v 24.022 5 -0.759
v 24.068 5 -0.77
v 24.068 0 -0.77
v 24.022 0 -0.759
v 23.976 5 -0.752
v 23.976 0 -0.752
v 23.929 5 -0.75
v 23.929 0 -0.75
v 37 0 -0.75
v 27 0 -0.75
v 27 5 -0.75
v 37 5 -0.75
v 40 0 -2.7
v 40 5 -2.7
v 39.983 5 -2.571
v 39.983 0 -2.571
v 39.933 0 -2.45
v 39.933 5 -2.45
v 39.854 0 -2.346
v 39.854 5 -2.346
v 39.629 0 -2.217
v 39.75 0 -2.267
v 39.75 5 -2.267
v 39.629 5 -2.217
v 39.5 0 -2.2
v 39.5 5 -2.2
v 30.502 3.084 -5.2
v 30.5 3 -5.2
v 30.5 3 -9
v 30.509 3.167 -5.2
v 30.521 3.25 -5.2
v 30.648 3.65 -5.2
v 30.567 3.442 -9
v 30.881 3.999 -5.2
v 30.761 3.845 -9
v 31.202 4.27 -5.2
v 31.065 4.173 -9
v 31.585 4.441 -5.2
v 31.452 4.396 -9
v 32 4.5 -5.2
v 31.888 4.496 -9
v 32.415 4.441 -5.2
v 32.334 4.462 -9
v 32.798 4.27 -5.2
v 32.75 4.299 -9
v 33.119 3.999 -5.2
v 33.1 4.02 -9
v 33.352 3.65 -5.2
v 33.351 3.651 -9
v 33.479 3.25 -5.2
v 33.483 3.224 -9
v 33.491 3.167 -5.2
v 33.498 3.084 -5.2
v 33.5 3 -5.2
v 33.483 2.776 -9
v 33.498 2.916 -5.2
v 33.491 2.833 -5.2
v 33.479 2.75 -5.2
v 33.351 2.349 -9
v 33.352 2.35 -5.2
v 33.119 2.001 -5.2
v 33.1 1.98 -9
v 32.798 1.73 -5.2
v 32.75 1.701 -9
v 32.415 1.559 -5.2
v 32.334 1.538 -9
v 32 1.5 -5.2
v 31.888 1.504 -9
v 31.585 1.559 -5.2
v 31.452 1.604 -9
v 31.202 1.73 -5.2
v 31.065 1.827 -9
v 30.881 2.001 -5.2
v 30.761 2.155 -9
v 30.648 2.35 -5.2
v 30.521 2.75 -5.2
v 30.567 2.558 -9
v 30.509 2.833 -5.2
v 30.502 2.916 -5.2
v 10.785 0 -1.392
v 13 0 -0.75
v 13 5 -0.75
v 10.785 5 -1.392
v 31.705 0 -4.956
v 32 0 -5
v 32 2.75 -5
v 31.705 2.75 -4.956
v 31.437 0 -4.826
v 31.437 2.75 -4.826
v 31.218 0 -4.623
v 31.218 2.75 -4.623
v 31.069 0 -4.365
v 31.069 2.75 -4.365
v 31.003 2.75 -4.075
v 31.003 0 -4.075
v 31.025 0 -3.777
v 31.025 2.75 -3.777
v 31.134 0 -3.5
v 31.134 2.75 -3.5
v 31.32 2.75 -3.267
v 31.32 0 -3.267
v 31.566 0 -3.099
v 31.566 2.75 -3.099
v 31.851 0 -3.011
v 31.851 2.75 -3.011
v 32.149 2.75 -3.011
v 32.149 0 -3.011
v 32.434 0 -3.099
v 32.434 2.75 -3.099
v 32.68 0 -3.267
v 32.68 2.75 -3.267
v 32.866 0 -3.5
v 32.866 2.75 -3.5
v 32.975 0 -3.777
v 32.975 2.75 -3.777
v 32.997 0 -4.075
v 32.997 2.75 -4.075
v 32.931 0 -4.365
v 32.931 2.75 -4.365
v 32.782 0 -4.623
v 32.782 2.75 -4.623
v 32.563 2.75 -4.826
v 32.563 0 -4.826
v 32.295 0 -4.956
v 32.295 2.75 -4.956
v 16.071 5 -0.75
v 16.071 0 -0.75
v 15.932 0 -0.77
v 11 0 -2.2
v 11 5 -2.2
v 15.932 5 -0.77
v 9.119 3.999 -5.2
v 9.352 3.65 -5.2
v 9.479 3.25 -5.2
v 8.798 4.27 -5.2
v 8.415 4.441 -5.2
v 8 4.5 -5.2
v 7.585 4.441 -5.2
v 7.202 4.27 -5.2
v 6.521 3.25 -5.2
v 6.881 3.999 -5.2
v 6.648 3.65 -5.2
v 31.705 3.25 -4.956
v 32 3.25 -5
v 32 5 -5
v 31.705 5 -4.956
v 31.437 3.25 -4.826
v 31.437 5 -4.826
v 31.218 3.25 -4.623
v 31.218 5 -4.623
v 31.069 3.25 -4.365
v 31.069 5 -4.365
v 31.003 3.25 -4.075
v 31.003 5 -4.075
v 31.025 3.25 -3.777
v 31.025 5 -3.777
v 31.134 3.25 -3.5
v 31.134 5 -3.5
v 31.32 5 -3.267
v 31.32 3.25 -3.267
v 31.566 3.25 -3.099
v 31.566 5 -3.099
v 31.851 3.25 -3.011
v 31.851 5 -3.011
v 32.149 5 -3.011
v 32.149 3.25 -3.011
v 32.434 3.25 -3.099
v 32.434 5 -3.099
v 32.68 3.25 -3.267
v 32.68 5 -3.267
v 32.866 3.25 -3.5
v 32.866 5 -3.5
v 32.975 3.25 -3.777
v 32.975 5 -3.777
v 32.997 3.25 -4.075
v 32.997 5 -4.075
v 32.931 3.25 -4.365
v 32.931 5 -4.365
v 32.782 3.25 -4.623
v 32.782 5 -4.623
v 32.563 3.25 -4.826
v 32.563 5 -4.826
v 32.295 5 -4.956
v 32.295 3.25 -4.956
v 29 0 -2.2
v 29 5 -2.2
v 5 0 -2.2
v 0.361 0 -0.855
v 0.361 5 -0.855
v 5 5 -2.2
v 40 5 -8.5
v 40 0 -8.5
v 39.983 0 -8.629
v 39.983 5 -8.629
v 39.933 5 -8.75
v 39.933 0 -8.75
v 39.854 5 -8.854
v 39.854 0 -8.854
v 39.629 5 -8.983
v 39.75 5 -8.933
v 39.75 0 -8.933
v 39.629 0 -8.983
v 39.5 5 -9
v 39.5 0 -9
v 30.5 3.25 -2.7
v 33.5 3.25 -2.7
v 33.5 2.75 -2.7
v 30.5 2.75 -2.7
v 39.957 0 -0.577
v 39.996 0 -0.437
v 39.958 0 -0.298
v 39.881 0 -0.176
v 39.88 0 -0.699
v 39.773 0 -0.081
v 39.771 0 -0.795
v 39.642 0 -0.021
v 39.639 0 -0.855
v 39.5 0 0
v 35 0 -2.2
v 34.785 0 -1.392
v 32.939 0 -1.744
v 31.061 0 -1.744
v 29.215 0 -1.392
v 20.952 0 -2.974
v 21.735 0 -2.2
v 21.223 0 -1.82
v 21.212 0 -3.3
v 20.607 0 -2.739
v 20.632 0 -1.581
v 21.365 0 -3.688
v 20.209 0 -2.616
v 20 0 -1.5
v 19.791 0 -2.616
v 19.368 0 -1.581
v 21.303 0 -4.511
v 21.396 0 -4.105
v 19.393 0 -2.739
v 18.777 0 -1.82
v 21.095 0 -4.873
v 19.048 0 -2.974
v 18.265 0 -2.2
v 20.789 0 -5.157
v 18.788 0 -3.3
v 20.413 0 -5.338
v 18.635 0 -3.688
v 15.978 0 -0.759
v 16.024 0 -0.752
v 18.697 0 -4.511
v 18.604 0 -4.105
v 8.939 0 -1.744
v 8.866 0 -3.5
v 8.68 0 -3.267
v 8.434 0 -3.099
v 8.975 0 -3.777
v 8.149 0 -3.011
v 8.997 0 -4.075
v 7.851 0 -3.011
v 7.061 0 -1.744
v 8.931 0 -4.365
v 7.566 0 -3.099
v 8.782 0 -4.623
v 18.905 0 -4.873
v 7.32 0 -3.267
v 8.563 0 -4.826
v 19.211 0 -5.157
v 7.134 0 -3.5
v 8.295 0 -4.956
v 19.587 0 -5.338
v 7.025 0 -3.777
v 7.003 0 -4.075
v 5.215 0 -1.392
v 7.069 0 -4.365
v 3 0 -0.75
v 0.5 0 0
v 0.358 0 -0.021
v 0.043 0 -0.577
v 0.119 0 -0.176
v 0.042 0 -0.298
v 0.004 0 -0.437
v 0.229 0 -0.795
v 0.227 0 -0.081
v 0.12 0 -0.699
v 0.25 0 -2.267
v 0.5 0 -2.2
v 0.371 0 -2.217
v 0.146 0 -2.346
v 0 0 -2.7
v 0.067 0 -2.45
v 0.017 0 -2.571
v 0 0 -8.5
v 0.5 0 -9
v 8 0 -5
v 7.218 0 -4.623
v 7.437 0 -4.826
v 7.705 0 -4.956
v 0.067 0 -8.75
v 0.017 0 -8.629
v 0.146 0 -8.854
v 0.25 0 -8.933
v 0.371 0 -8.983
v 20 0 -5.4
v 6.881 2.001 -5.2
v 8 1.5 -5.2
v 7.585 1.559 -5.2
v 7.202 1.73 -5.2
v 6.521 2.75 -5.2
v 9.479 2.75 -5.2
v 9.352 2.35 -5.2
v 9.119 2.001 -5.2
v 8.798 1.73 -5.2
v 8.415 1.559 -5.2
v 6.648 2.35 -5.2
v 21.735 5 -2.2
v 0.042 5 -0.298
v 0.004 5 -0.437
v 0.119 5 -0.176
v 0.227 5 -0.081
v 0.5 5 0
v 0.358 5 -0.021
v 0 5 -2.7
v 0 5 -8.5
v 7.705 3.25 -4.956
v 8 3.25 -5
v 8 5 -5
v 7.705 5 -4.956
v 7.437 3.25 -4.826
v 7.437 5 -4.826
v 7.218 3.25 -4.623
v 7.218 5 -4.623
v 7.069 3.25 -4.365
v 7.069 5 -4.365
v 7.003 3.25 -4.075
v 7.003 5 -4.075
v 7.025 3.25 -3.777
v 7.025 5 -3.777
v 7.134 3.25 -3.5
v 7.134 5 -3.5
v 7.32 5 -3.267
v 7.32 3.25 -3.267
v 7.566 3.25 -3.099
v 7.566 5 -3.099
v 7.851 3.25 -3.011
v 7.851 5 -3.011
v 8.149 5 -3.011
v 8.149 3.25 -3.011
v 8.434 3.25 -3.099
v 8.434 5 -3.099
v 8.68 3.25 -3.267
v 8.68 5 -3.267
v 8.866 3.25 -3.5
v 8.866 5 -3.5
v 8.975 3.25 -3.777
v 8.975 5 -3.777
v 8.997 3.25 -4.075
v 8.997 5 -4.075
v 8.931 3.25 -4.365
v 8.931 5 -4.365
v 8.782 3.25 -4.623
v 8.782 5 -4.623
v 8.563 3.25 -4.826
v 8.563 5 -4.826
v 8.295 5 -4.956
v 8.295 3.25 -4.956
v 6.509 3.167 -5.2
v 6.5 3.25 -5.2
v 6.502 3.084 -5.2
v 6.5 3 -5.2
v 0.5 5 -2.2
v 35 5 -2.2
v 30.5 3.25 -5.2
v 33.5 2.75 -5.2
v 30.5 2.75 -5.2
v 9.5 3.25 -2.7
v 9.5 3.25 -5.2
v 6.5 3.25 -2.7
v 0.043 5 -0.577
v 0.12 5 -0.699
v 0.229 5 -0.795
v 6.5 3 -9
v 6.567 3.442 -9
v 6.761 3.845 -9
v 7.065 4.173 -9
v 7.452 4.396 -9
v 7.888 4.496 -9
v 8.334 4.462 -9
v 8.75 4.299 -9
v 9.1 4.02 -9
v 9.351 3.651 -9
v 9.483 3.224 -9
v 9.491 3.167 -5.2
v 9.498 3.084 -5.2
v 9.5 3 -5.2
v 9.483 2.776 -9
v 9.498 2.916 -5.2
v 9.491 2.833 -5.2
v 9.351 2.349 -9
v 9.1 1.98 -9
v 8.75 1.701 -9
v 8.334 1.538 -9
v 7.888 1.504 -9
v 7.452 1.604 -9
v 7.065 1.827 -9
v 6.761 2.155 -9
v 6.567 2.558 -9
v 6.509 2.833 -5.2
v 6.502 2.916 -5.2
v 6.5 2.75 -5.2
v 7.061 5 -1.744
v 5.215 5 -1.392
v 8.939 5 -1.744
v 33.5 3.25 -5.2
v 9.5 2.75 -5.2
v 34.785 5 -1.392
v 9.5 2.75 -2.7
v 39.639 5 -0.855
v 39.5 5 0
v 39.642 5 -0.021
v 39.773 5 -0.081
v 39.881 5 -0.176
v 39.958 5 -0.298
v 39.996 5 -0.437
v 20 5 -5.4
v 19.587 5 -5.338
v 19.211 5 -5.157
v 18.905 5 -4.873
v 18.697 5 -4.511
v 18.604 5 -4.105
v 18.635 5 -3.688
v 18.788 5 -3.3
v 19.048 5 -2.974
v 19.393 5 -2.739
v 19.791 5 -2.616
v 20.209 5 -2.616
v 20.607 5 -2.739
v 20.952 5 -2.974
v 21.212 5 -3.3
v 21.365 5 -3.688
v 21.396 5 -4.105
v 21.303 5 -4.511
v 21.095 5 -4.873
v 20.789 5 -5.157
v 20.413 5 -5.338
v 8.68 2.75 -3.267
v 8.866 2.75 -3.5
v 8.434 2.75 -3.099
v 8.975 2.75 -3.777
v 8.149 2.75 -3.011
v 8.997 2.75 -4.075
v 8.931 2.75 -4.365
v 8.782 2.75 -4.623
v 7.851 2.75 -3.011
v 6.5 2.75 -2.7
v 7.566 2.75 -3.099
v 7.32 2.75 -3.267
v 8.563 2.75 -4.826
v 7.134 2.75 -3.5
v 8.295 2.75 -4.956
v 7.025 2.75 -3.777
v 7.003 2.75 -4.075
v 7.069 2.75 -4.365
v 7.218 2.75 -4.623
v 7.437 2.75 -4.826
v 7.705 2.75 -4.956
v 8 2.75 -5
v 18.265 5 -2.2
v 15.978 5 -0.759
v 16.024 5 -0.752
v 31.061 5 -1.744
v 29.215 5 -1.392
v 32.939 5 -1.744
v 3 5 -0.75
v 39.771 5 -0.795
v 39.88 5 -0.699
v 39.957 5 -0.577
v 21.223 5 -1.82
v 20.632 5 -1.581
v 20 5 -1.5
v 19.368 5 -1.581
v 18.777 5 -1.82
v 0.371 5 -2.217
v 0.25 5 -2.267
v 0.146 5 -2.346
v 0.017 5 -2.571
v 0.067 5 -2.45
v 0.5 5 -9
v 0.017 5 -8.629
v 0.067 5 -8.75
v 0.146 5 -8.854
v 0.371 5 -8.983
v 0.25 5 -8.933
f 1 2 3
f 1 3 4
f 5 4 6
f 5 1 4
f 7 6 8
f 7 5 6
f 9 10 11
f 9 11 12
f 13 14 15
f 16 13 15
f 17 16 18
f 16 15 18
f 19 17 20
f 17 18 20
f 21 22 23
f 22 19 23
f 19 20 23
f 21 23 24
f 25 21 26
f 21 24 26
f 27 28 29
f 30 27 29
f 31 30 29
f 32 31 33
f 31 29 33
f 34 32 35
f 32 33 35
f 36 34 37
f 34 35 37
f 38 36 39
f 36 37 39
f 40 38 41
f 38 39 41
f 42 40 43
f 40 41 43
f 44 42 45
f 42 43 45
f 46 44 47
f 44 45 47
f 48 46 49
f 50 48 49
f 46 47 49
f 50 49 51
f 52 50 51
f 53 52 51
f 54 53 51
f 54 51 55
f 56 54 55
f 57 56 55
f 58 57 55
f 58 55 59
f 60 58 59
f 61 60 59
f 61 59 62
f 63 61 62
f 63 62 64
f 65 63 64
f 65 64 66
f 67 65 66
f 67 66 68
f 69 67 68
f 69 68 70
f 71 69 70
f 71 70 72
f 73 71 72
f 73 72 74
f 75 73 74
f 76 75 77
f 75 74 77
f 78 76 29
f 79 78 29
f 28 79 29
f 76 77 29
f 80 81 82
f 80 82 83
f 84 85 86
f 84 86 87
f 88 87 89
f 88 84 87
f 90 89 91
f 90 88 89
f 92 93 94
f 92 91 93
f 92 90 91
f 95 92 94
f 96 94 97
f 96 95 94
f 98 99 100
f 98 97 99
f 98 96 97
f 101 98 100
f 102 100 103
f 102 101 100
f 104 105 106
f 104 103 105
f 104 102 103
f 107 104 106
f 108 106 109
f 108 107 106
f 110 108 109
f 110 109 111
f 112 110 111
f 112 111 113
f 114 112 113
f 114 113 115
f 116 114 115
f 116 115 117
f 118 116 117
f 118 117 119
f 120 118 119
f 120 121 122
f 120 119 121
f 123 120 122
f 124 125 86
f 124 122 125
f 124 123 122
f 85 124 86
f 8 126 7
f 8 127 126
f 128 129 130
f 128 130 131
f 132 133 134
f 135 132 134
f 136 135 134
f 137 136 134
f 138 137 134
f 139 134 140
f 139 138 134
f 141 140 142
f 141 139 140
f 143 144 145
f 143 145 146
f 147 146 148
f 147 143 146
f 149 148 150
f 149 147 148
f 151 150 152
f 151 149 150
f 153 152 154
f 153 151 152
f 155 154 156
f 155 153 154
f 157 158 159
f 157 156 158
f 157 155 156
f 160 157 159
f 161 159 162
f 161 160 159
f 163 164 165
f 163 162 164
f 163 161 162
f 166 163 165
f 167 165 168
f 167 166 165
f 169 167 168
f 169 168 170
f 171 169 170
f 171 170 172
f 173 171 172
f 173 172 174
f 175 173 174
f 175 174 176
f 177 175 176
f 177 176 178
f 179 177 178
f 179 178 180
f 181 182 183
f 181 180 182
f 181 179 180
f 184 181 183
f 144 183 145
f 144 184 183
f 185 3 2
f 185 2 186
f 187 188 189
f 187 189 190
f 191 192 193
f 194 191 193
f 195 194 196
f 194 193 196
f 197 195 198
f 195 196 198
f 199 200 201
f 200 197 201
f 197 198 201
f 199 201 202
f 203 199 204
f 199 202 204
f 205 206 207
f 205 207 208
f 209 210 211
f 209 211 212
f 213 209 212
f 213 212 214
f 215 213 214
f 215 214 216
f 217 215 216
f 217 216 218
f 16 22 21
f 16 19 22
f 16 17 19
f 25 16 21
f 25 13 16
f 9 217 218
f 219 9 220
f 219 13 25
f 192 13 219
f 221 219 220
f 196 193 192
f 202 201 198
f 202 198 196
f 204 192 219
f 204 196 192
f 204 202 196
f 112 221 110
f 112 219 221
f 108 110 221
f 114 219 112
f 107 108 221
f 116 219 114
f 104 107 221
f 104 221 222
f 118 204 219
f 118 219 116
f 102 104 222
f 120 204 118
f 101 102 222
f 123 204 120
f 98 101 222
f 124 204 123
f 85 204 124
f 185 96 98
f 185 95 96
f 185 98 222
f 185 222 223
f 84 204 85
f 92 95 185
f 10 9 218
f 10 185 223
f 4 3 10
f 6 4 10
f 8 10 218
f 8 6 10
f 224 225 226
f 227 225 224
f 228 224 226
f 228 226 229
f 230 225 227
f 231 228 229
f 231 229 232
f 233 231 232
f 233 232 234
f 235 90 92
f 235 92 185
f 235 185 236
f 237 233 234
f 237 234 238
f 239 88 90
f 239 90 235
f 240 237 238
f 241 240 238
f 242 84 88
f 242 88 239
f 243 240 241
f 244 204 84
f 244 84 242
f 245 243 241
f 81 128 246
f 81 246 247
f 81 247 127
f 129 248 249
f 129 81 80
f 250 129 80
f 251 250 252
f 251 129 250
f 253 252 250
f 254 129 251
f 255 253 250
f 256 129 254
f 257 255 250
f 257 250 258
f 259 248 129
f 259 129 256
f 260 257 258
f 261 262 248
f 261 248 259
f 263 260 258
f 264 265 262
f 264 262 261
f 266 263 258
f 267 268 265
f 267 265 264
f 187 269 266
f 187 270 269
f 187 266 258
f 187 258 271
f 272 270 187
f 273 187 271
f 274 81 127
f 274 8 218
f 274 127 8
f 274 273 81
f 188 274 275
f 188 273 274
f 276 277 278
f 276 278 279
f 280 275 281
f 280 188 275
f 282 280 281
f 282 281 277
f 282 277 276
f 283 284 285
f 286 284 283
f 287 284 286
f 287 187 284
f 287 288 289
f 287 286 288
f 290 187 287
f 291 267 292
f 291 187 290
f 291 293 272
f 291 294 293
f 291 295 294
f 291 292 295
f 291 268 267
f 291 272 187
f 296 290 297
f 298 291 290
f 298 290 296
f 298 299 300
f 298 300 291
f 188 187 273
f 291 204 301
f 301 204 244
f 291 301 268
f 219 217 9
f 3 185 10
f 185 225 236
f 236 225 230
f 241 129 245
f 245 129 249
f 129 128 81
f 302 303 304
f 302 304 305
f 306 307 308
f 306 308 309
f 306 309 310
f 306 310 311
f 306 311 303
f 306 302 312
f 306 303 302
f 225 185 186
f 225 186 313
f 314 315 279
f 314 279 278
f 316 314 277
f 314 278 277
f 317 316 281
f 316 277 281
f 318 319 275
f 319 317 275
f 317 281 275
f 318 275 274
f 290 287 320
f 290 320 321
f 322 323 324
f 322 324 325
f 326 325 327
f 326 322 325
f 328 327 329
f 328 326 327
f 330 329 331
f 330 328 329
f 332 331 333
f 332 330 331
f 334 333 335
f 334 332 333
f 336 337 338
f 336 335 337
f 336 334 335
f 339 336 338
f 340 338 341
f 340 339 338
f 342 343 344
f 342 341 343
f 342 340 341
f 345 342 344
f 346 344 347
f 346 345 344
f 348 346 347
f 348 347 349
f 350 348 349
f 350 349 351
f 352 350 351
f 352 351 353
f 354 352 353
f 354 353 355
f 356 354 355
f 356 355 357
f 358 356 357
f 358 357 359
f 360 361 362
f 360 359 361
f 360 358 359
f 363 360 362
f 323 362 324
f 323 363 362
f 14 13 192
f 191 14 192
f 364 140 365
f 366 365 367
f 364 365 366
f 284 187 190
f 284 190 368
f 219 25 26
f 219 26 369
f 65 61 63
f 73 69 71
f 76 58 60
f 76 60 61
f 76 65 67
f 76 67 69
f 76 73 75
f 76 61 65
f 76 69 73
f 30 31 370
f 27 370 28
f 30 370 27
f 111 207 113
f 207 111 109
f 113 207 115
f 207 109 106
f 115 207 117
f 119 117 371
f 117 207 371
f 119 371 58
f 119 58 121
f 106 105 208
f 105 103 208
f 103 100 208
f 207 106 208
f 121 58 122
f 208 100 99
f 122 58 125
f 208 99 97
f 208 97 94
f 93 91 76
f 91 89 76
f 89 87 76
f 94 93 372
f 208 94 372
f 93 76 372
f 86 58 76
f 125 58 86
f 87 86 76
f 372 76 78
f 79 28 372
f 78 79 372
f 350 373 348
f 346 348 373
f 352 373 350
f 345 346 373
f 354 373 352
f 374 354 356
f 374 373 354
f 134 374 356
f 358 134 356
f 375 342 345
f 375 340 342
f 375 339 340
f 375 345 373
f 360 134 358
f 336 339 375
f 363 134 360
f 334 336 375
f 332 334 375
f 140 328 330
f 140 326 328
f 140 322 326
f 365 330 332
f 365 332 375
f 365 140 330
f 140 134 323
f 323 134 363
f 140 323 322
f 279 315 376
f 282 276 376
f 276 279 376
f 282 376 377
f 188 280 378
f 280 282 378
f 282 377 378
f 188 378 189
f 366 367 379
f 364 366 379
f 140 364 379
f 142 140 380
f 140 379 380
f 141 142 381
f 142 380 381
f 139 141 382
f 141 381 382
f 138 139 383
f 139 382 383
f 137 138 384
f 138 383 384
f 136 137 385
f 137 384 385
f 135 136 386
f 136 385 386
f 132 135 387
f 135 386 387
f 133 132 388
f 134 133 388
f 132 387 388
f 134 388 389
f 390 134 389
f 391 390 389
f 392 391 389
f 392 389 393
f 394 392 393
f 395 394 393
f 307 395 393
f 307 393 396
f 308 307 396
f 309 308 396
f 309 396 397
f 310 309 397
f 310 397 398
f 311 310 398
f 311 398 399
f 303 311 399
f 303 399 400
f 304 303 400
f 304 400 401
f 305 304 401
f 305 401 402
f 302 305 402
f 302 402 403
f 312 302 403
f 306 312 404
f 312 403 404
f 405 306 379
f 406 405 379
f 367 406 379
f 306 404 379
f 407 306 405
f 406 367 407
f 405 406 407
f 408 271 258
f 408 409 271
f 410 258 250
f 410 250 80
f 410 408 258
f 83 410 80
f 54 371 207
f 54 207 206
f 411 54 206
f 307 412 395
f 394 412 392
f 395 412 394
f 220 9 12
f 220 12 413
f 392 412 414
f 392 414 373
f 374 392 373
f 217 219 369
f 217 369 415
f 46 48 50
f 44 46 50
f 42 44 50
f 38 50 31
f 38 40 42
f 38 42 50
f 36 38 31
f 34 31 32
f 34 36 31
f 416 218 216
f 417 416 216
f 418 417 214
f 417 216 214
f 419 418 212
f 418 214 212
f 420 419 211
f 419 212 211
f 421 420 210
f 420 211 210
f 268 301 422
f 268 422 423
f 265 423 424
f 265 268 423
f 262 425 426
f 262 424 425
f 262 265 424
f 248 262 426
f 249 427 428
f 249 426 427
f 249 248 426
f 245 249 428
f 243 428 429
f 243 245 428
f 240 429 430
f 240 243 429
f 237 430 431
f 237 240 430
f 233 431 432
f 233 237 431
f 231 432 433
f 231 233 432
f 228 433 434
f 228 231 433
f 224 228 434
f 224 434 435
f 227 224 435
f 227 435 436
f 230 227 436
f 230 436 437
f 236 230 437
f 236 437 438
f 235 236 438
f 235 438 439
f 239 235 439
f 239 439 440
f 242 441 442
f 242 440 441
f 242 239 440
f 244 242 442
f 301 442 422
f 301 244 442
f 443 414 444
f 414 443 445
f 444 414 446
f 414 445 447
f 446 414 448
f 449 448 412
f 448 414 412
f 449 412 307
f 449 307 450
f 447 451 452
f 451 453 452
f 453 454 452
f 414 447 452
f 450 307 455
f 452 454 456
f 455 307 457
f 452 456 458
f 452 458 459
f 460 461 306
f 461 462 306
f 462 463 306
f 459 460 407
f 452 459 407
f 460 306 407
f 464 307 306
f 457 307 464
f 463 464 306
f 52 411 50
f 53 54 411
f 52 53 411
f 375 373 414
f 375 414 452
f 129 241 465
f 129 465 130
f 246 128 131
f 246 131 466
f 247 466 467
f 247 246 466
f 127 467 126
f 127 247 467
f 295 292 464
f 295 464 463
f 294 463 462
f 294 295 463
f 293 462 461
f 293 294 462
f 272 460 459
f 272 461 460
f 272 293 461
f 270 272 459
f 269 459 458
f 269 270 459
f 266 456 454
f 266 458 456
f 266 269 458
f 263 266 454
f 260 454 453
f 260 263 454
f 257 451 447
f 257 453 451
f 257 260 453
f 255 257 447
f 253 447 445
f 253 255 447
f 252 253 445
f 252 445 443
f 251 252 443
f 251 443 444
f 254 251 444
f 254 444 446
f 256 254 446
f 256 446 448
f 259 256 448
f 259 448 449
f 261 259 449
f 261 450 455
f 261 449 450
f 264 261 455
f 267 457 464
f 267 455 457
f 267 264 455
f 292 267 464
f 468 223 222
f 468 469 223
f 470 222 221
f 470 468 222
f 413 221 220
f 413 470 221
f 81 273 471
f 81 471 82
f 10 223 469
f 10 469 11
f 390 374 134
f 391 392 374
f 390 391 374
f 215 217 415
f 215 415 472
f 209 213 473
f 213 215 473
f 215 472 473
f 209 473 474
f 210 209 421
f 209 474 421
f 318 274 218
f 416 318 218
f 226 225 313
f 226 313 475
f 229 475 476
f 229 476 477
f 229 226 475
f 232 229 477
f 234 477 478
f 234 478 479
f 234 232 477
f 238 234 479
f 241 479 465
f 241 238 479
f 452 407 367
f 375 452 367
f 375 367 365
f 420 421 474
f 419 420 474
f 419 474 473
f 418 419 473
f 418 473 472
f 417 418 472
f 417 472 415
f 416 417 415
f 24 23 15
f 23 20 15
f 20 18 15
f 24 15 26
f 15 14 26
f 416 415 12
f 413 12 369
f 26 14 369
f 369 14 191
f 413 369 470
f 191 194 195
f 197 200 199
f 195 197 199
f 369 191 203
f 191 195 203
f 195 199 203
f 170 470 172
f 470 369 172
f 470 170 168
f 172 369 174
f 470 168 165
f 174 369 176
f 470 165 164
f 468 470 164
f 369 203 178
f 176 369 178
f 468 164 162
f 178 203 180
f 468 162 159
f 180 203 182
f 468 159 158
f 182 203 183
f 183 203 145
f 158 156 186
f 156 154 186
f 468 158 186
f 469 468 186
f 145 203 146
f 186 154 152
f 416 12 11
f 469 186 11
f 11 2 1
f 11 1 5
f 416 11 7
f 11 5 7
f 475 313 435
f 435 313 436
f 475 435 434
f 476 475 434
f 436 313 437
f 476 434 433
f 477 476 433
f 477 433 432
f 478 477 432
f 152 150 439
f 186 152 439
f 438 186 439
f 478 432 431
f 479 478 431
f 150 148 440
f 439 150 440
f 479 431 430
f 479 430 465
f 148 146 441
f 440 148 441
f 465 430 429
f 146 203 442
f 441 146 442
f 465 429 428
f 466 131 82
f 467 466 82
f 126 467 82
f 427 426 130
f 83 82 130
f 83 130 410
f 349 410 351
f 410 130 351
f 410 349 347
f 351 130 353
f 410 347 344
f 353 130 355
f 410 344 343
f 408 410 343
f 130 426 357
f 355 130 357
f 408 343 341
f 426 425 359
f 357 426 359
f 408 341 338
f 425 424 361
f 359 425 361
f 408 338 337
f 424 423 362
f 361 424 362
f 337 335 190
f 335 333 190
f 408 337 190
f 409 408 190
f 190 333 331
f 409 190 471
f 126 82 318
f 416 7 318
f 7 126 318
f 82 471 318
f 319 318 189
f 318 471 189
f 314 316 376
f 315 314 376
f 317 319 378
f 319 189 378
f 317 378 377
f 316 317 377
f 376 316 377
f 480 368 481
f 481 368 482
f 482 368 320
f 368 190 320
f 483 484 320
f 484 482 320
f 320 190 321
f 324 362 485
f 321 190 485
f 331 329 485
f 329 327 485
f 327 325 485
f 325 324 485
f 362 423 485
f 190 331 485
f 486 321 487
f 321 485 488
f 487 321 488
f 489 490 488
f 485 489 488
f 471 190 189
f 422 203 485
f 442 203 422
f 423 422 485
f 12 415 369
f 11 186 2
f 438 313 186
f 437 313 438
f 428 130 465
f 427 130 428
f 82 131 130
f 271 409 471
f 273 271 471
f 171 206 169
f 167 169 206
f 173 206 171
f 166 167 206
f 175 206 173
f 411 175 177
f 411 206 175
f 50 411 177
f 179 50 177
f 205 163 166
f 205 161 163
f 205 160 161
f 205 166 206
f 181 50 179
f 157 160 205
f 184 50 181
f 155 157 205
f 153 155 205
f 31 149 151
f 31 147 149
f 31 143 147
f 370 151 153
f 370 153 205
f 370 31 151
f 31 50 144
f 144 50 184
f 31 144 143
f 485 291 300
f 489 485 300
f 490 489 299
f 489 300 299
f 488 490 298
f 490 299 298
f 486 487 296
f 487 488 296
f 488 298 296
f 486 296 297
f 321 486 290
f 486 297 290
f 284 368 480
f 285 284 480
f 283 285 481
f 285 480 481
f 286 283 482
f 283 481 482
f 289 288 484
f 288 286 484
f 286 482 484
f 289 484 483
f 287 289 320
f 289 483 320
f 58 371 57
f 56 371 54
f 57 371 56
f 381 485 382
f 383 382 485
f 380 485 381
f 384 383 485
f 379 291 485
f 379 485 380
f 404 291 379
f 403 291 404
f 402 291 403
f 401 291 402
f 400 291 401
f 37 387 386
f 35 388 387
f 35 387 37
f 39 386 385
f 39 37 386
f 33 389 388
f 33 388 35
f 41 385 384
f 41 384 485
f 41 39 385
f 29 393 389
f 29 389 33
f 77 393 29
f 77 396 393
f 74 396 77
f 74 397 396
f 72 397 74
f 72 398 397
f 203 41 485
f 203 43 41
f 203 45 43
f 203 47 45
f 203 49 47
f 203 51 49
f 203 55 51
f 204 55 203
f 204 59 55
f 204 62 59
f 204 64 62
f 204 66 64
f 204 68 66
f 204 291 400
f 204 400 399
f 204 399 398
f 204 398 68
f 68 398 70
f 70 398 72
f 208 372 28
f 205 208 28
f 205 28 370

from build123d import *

# Parameters (mm, degrees)
SKETCH1_W               = 40
SKETCH1_H               = 9
BOSS_EXTRUDE1_DEPTH     = 5
CUT_EXTRUDE1_DEPTH      = 5
CUT_EXTRUDE1_DEPTH_BACK = 10
SKETCH2_R               = 1
SKETCH2_R_2             = 1.4
FILLET1_R               = 10
FILLET2_R               = 0.5
SKETCH3_R               = 1.5
CUT_EXTRUDE6_DEPTH      = 3.8
SKETCH4_W               = 3
SKETCH4_H               = 0.5
CUT_EXTRUDE7_DEPTH      = 2.5


with BuildPart() as part:
    # Sketch1 → Boss-Extrude1 (new body)
    with BuildSketch(Plane(origin=(0, 0, 0), x_dir=(1, 0, 0), z_dir=(0, 1, 0))):
        with Locations((20, 4.5)):
            Rectangle(SKETCH1_W, SKETCH1_H)
    extrude(amount=BOSS_EXTRUDE1_DEPTH)

    # Sketch2 → Cut-Extrude1 (cut, two sides: drawn at the far end of the back side and taken through both)
    with BuildSketch(Plane(origin=(0, 5, 0), x_dir=(1, 0, 0), z_dir=(0, 1, 0)).offset(-CUT_EXTRUDE1_DEPTH_BACK)):
        with Locations(Location((8, 4, 0), (0, 0, 90))):
            Circle(SKETCH2_R)
        with Locations(Location((32, 4, 0), (0, 0, 90))):
            Circle(SKETCH2_R)
        with Locations(Location((20, 4, 0), (0, 0, 90))):
            Circle(SKETCH2_R_2)
        with BuildLine():
            ThreePointArc((21.734935157, 2.2), (20, 1.5), (18.265064843, 2.2))
            Line((18.265064843, 2.2), (11, 2.2))
            Line((11, 2.2), (16, 0.75))
            Line((16, 0.75), (24, 0.75))
            Line((24, 0.75), (29, 2.2))
            Line((29, 2.2), (21.734935157, 2.2))
        make_face()
        Polygon((13, 0.75), (8, 2.2), (3, 0.75), align=None)
        Polygon((37, 0.75), (32, 2.2), (27, 0.75), align=None)
        Polygon((0, 0.75), (5, 2.2), (0, 2.2), align=None)
        Polygon((40, 2.2), (35, 2.2), (40, 0.75), align=None)
    extrude(amount=CUT_EXTRUDE1_DEPTH + CUT_EXTRUDE1_DEPTH_BACK, mode=Mode.SUBTRACT)

    # Fillet1
    fillet1_edges = [part.edges().sort_by_distance(p)[0] for p in [
        (32, 2.5, -2.2),
        (8, 2.5, -2.2),
    ]]
    fillet(fillet1_edges, radius=FILLET1_R)

    # Fillet2
    # the kernel refuses this fillet: 0.5 mm, written as the material it adds along each edge
    with BuildSketch(Plane(origin=(24, 5, -0.75), x_dir=(0.9604291387787307, 0, -0.27852445024583705), z_dir=(0, -1, 0))) as fillet2_piece_1:
        with BuildLine():
            CenterArc((FILLET2_R * 0.142073204655, -FILLET2_R), FILLET2_R, 90, 16.172159016)
            Line((-FILLET2_R * 0.136451245591, -FILLET2_R * 0.0395708612213), (0, 0))
            Line((0, 0), (FILLET2_R * 0.142073204655, 0))
        make_face()
    extrude(amount=5)
    with BuildSketch(Plane(origin=(16, 0, -0.75), x_dir=(1, 0, 0), z_dir=(0, 1, 0))) as fillet2_piece_2:
        with BuildLine():
            CenterArc((FILLET2_R * 0.142073204655, FILLET2_R), FILLET2_R, 253.827840984, 16.172159016)
            Line((-FILLET2_R * 0.136451245591, FILLET2_R * 0.0395708612213), (0, 0))
            Line((0, 0), (FILLET2_R * 0.142073204655, 0))
        make_face()
    extrude(amount=5)
    # the kernel refuses this fillet: 0.5 mm, written as the material it takes off along each edge
    with BuildSketch(Plane(origin=(0, 5.939001537, -0.75), x_dir=(0.960429138778732, 0, -0.2785244502458324), z_dir=(0, -1, 0)), Plane(origin=(40, 5.939001537, -0.75), x_dir=(0, 0, 1), z_dir=(0, -1, 0))) as fillet2_2_piece_1:
        with BuildLine():
            CenterArc((FILLET2_R * 0.75120122935, FILLET2_R), FILLET2_R, 196.172159016, 73.827840984)
            Line((-FILLET2_R * 0.209227909429, FILLET2_R * 0.721475549754), (0, 0))
            Line((0, 0), (FILLET2_R * 0.75120122935, 0))
        make_face()
    extrude(amount=6.878003073, mode=Mode.SUBTRACT)
    with BuildSketch(Plane(origin=(0, 6.25, -2.2), x_dir=(0, 0, -1), z_dir=(0, -1, 0)), Plane(origin=(40, 6.25, -2.2), x_dir=(-1, 0, 0), z_dir=(0, -1, 0)), Plane(origin=(0, -1.25, 0), x_dir=(1, 0, 0), z_dir=(0, 1, 0))) as fillet2_2_piece_2:
        with BuildLine():
            CenterArc((FILLET2_R, FILLET2_R), FILLET2_R, 180, 90)
            Line((0, FILLET2_R), (0, 0))
            Line((0, 0), (FILLET2_R, 0))
        make_face()
    extrude(amount=7.5, mode=Mode.SUBTRACT)
    with BuildSketch(Plane(origin=(0, -1.25, -9), x_dir=(1, 0, 0), z_dir=(0, 1, 0)), Plane(origin=(40, -1.25, -9), x_dir=(0, 0, 1), z_dir=(0, 1, 0)), Plane(origin=(40, -1.25, 0), x_dir=(-1, 0, 0), z_dir=(0, 1, 0))) as fillet2_2_piece_3:
        with BuildLine():
            CenterArc((FILLET2_R, -FILLET2_R), FILLET2_R, 90, 90)
            Line((0, -FILLET2_R), (0, 0))
            Line((0, 0), (FILLET2_R, 0))
        make_face()
    extrude(amount=7.5, mode=Mode.SUBTRACT)

    # Sketch3 → Cut-Extrude6 (cut)
    with BuildSketch(Plane(origin=(0, 0, -9), x_dir=(-1, 0, 0), z_dir=(0, 0, -1))):
        with Locations((-32, 3)):
            Circle(SKETCH3_R)
        with Locations((-8, 3)):
            Circle(SKETCH3_R)
    extrude(amount=-CUT_EXTRUDE6_DEPTH, mode=Mode.SUBTRACT)

    # Sketch4 → Cut-Extrude7 (cut)
    with BuildSketch(Plane(origin=(0, 0, -5.2), x_dir=(-1, 0, 0), z_dir=(0, 0, -1))):
        with Locations((-32, 3)):
            Rectangle(SKETCH4_W, SKETCH4_H)
        with Locations((-8, 3)):
            Rectangle(SKETCH4_W, SKETCH4_H)
    extrude(amount=-CUT_EXTRUDE7_DEPTH, mode=Mode.SUBTRACT)


solid = part.part
